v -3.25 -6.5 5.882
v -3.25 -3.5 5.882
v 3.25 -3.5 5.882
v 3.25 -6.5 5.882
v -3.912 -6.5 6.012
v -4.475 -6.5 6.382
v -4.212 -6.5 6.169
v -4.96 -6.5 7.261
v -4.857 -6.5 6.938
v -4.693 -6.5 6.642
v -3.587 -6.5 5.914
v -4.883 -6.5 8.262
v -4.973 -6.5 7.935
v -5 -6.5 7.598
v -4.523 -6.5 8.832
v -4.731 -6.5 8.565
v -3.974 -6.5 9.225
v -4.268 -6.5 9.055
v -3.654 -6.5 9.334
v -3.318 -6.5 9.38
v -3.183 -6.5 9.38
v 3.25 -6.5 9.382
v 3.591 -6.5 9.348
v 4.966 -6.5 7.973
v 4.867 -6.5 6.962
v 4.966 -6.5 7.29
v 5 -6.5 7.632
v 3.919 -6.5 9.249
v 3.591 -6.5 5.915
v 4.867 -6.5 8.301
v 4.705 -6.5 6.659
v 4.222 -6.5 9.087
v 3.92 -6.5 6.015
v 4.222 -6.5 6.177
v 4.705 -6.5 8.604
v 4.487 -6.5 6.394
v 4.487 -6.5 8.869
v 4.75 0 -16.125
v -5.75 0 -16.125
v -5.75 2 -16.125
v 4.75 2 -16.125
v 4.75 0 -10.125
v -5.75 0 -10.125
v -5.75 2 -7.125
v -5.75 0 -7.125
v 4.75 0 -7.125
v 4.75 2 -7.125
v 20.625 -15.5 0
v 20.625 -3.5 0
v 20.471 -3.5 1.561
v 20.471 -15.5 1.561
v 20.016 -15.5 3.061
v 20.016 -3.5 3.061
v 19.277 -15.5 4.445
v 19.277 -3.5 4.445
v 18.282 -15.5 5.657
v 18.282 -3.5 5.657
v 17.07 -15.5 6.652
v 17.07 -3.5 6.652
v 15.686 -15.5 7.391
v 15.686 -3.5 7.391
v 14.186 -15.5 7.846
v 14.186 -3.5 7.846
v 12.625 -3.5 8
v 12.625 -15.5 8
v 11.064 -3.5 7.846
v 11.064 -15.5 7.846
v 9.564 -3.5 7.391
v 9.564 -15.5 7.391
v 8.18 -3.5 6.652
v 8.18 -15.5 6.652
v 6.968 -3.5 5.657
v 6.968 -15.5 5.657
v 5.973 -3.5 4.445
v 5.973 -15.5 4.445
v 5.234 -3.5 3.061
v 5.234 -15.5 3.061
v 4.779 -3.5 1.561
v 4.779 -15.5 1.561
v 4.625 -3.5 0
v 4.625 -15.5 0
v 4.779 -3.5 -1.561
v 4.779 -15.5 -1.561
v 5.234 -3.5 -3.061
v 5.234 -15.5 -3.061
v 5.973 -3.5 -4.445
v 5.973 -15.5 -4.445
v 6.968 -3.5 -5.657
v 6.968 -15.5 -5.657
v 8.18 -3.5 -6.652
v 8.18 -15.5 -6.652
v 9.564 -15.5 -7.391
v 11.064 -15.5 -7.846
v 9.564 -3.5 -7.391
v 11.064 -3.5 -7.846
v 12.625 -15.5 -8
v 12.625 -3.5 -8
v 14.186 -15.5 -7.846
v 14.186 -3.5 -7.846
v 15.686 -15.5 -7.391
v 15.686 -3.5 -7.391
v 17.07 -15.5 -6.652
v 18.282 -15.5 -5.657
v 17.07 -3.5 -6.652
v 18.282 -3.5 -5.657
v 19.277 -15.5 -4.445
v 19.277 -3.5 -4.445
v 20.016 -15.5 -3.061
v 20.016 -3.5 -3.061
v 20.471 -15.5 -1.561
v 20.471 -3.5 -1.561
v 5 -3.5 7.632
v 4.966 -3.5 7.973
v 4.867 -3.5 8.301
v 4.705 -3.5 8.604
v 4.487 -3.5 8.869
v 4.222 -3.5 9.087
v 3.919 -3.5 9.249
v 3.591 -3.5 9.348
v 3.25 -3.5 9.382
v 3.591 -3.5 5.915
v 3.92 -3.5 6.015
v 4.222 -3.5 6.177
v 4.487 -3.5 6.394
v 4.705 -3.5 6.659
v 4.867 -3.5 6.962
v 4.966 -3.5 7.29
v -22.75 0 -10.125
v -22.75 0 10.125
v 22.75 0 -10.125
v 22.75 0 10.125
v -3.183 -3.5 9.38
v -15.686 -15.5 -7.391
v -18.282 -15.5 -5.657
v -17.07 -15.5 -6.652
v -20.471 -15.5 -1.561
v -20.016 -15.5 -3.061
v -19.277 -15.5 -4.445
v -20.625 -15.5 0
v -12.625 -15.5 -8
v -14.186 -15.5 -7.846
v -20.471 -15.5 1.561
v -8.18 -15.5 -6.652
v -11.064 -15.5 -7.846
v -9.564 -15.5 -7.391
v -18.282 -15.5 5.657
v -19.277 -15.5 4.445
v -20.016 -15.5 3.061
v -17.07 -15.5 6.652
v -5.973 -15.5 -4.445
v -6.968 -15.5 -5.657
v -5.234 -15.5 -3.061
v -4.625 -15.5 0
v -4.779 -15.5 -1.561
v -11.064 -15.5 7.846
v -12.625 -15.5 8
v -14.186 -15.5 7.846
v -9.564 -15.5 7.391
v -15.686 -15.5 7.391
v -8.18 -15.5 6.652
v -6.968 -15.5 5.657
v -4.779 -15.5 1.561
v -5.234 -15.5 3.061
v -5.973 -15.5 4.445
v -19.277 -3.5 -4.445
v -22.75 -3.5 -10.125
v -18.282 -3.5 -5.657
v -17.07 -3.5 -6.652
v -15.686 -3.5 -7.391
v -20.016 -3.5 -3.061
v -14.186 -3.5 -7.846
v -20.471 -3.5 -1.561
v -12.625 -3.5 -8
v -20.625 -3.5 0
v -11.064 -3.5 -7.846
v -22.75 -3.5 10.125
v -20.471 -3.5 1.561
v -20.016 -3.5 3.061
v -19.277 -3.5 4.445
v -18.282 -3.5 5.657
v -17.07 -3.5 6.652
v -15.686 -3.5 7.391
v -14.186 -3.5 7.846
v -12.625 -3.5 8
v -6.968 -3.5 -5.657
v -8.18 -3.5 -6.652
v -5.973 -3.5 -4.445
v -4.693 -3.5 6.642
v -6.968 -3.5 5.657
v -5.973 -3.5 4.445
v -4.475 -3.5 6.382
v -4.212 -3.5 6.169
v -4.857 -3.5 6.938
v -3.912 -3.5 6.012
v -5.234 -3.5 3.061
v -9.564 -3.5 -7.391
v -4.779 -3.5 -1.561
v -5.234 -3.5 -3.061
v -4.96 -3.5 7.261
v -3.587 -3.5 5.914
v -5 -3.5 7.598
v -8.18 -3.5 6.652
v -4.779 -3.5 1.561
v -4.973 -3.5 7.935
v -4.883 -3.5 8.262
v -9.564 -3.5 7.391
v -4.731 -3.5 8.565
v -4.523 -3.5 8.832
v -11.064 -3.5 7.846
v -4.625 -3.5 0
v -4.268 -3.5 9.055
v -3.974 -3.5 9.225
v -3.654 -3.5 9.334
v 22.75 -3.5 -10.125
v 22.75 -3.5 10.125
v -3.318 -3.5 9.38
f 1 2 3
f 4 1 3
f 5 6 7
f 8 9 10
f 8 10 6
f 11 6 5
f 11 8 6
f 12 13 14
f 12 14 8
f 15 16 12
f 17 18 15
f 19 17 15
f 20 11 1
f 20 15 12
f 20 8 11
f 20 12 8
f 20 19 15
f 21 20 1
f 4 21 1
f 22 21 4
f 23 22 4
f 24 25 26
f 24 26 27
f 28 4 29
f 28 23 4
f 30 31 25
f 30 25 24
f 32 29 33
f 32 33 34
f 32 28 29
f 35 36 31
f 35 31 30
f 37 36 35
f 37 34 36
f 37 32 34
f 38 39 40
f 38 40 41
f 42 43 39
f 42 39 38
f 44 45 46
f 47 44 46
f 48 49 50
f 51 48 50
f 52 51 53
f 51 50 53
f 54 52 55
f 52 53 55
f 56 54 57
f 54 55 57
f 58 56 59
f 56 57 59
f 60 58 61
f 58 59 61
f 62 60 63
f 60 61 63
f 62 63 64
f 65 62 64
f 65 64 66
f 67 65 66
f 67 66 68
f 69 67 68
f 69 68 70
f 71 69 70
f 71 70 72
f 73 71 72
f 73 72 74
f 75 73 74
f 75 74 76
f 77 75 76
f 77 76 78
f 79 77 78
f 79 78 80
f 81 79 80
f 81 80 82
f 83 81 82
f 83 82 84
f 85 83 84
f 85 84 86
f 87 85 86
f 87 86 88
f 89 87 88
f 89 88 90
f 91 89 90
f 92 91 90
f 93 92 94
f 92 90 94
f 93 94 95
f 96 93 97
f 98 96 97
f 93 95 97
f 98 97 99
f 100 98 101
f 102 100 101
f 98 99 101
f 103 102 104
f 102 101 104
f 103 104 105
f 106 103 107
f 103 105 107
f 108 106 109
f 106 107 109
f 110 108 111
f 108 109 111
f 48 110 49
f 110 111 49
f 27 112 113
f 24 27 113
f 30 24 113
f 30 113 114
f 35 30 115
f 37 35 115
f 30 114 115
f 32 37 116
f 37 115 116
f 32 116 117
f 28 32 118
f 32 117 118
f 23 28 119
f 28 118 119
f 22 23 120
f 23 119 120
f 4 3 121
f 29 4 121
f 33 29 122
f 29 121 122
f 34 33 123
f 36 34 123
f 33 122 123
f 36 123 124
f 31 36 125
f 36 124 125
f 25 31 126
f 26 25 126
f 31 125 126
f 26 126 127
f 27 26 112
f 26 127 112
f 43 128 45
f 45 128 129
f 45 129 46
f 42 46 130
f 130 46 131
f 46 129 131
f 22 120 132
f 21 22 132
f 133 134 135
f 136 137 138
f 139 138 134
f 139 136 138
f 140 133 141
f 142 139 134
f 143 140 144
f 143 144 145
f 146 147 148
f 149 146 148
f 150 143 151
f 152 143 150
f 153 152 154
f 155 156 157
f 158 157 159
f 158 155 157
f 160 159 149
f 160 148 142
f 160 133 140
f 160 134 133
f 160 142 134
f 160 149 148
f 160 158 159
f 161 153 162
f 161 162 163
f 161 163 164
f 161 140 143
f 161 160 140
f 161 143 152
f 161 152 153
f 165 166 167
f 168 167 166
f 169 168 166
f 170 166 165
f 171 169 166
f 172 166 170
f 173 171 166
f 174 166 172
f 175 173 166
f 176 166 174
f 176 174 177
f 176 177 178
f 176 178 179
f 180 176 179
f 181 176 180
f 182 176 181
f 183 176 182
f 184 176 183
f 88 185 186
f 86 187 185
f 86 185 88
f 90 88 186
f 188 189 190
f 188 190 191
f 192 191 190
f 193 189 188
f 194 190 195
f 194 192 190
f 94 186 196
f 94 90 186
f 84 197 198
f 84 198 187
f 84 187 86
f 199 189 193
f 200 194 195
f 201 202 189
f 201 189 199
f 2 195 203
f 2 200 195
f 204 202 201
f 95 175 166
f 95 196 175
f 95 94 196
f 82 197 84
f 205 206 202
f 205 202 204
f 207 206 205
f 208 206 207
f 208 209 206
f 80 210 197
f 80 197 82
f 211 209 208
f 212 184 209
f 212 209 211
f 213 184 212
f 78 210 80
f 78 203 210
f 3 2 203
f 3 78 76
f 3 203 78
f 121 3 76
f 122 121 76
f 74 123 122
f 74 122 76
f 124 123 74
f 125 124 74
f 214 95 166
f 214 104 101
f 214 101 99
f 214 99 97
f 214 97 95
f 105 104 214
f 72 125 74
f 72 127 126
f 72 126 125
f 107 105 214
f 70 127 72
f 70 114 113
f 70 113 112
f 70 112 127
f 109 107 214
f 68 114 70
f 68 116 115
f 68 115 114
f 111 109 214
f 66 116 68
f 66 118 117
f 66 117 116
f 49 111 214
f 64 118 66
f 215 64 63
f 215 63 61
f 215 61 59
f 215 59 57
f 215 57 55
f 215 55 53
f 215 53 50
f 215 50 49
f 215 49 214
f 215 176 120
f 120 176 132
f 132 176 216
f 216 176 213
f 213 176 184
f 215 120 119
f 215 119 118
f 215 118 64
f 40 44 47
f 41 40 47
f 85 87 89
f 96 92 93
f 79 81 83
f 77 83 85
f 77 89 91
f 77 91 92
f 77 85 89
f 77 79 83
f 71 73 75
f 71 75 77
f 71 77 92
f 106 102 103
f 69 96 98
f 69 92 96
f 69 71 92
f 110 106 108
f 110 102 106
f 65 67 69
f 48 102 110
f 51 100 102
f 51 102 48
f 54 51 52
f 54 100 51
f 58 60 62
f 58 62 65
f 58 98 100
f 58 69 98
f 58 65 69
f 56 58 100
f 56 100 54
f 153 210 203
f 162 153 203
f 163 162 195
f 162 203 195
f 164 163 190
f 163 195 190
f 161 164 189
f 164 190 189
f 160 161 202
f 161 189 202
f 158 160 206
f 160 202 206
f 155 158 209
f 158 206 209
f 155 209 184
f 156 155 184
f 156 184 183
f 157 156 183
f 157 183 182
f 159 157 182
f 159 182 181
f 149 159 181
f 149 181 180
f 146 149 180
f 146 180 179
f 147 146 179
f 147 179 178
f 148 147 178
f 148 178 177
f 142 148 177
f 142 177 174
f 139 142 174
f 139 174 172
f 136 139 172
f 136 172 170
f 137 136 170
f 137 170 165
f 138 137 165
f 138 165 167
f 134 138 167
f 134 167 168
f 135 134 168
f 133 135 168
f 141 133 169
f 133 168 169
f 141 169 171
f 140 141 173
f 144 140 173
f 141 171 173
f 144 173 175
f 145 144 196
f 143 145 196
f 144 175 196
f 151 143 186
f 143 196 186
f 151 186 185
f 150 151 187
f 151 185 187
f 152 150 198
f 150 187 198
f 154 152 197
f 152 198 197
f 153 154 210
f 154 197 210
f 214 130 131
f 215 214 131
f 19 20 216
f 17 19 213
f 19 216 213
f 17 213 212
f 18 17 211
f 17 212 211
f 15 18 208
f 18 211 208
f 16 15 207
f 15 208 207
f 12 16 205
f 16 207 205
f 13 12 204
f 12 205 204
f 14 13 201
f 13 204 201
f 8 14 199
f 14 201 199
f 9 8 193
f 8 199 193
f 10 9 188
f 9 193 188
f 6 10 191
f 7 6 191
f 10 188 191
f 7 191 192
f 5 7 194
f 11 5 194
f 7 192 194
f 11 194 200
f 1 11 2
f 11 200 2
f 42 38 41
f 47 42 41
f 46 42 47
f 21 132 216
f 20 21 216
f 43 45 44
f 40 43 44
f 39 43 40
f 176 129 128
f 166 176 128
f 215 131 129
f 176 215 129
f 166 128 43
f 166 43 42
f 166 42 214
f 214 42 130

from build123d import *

# Parameters (mm, degrees)
F0_R     = 8
F0_W     = 10.5
F0_H     = 3
F1_DEPTH = 3.5
F2_DEPTH = 15.5
F3_DEPTH = 6.5
F0_H_2   = 6
F4_DEPTH = 2


with BuildPart() as f1:
    # F0 (on Front) → F1 (new body)
    with BuildSketch(Plane.XZ):
        Polygon((22.75, 10.125), (-22.75, 10.125), (-22.75, -10.125), (-5.75, -10.125), (-5.75, -7.125), (4.75, -7.125), (4.75, -10.125), (22.75, -10.125), align=None)
        with Locations((-12.625, 0)):
            Circle(F0_R, mode=Mode.SUBTRACT)
        with Locations((12.625, 0)):
            Circle(F0_R, mode=Mode.SUBTRACT)
        with BuildLine():
            ThreePointArc((-3.25, 5.8816159739), (-4.9996694778, 7.5976054108), (-3.3180082792, 9.38029401))
            ThreePointArc((-3.3180082792, 9.38029401), (-3.2503522375, 9.3816159385), (-3.1826956692, 9.3803212456))
            Line((-3.1826956692, 9.3803212456), (3.2496477625, 9.3816159385))
            ThreePointArc((3.2496477625, 9.3816159385), (4.487312326, 8.8691773695), (5, 7.6316159739))
            ThreePointArc((5, 7.6316159739), (4.4874368671, 6.3941791069), (3.25, 5.8816159739))
            Line((3.25, 5.8816159739), (-3.25, 5.8816159739))
        make_face(mode=Mode.SUBTRACT)
        with Locations((-0.5, -8.625)):
            Rectangle(F0_W, F0_H)
        with Locations((-12.625, 0)):
            Circle(F0_R)
        with Locations((12.625, 0)):
            Circle(F0_R)
        with BuildLine():
            ThreePointArc((-3.1826956692, 9.3803212456), (-3.2503522375, 9.3816159385), (-3.3180082792, 9.38029401))
            Line((-3.3180082792, 9.38029401), (-3.1826956692, 9.3803212456))
        make_face()
    extrude(amount=F1_DEPTH)

    # F0 (on Front) → F2 (join)
    with BuildSketch(Plane.XZ):
        with Locations((-12.625, 0)):
            Circle(F0_R)
        with Locations((12.625, 0)):
            Circle(F0_R)
    extrude(amount=F2_DEPTH)

    # F0 (on Front) → F3 (join)
    with BuildSketch(Plane.XZ):
        with BuildLine():
            Line((3.2496477625, 9.3816159385), (-3.1826956692, 9.3803212456))
            ThreePointArc((-3.1826956692, 9.3803212456), (-1.988991955, 8.8450238652), (-1.5, 7.6316159739))
            Line((-1.5, 7.6316159739), (1.5, 7.6316159739))
            ThreePointArc((1.5, 7.6316159739), (2.0124386044, 8.8689283), (3.2496477625, 9.3816159385))
        make_face()
        with BuildLine():
            ThreePointArc((-1.5, 7.6316159739), (-2.0125631329, 6.3941791069), (-3.25, 5.8816159739))
            Line((-3.25, 5.8816159739), (3.25, 5.8816159739))
            ThreePointArc((3.25, 5.8816159739), (2.0125631329, 6.3941791069), (1.5, 7.6316159739))
            Line((1.5, 7.6316159739), (-1.5, 7.6316159739))
        make_face()
        with BuildLine():
            Line((-3.1826956692, 9.3803212456), (-3.3180082792, 9.38029401))
            ThreePointArc((-3.3180082792, 9.38029401), (-4.9996694778, 7.5976054108), (-3.25, 5.8816159739))
            ThreePointArc((-3.25, 5.8816159739), (-2.0125631329, 6.3941791069), (-1.5, 7.6316159739))
            ThreePointArc((-1.5, 7.6316159739), (-1.988991955, 8.8450238652), (-3.1826956692, 9.3803212456))
        make_face()
        with BuildLine():
            ThreePointArc((1.5, 7.6316159739), (2.0125631329, 6.3941791069), (3.25, 5.8816159739))
            ThreePointArc((3.25, 5.8816159739), (4.4874368671, 6.3941791069), (5, 7.6316159739))
            ThreePointArc((5, 7.6316159739), (4.487312326, 8.8691773695), (3.2496477625, 9.3816159385))
            ThreePointArc((3.2496477625, 9.3816159385), (2.0124386044, 8.8689283), (1.5, 7.6316159739))
        make_face()
    extrude(amount=F3_DEPTH)

    # F0 (on Front) → F4 (join)
    with BuildSketch(Plane.XZ):
        with Locations((-0.5, -8.625)):
            Rectangle(F0_W, F0_H)
        with Locations((-0.5, -13.125)):
            Rectangle(F0_W, F0_H_2)
    extrude(amount=-F4_DEPTH)


solid = f1.part
